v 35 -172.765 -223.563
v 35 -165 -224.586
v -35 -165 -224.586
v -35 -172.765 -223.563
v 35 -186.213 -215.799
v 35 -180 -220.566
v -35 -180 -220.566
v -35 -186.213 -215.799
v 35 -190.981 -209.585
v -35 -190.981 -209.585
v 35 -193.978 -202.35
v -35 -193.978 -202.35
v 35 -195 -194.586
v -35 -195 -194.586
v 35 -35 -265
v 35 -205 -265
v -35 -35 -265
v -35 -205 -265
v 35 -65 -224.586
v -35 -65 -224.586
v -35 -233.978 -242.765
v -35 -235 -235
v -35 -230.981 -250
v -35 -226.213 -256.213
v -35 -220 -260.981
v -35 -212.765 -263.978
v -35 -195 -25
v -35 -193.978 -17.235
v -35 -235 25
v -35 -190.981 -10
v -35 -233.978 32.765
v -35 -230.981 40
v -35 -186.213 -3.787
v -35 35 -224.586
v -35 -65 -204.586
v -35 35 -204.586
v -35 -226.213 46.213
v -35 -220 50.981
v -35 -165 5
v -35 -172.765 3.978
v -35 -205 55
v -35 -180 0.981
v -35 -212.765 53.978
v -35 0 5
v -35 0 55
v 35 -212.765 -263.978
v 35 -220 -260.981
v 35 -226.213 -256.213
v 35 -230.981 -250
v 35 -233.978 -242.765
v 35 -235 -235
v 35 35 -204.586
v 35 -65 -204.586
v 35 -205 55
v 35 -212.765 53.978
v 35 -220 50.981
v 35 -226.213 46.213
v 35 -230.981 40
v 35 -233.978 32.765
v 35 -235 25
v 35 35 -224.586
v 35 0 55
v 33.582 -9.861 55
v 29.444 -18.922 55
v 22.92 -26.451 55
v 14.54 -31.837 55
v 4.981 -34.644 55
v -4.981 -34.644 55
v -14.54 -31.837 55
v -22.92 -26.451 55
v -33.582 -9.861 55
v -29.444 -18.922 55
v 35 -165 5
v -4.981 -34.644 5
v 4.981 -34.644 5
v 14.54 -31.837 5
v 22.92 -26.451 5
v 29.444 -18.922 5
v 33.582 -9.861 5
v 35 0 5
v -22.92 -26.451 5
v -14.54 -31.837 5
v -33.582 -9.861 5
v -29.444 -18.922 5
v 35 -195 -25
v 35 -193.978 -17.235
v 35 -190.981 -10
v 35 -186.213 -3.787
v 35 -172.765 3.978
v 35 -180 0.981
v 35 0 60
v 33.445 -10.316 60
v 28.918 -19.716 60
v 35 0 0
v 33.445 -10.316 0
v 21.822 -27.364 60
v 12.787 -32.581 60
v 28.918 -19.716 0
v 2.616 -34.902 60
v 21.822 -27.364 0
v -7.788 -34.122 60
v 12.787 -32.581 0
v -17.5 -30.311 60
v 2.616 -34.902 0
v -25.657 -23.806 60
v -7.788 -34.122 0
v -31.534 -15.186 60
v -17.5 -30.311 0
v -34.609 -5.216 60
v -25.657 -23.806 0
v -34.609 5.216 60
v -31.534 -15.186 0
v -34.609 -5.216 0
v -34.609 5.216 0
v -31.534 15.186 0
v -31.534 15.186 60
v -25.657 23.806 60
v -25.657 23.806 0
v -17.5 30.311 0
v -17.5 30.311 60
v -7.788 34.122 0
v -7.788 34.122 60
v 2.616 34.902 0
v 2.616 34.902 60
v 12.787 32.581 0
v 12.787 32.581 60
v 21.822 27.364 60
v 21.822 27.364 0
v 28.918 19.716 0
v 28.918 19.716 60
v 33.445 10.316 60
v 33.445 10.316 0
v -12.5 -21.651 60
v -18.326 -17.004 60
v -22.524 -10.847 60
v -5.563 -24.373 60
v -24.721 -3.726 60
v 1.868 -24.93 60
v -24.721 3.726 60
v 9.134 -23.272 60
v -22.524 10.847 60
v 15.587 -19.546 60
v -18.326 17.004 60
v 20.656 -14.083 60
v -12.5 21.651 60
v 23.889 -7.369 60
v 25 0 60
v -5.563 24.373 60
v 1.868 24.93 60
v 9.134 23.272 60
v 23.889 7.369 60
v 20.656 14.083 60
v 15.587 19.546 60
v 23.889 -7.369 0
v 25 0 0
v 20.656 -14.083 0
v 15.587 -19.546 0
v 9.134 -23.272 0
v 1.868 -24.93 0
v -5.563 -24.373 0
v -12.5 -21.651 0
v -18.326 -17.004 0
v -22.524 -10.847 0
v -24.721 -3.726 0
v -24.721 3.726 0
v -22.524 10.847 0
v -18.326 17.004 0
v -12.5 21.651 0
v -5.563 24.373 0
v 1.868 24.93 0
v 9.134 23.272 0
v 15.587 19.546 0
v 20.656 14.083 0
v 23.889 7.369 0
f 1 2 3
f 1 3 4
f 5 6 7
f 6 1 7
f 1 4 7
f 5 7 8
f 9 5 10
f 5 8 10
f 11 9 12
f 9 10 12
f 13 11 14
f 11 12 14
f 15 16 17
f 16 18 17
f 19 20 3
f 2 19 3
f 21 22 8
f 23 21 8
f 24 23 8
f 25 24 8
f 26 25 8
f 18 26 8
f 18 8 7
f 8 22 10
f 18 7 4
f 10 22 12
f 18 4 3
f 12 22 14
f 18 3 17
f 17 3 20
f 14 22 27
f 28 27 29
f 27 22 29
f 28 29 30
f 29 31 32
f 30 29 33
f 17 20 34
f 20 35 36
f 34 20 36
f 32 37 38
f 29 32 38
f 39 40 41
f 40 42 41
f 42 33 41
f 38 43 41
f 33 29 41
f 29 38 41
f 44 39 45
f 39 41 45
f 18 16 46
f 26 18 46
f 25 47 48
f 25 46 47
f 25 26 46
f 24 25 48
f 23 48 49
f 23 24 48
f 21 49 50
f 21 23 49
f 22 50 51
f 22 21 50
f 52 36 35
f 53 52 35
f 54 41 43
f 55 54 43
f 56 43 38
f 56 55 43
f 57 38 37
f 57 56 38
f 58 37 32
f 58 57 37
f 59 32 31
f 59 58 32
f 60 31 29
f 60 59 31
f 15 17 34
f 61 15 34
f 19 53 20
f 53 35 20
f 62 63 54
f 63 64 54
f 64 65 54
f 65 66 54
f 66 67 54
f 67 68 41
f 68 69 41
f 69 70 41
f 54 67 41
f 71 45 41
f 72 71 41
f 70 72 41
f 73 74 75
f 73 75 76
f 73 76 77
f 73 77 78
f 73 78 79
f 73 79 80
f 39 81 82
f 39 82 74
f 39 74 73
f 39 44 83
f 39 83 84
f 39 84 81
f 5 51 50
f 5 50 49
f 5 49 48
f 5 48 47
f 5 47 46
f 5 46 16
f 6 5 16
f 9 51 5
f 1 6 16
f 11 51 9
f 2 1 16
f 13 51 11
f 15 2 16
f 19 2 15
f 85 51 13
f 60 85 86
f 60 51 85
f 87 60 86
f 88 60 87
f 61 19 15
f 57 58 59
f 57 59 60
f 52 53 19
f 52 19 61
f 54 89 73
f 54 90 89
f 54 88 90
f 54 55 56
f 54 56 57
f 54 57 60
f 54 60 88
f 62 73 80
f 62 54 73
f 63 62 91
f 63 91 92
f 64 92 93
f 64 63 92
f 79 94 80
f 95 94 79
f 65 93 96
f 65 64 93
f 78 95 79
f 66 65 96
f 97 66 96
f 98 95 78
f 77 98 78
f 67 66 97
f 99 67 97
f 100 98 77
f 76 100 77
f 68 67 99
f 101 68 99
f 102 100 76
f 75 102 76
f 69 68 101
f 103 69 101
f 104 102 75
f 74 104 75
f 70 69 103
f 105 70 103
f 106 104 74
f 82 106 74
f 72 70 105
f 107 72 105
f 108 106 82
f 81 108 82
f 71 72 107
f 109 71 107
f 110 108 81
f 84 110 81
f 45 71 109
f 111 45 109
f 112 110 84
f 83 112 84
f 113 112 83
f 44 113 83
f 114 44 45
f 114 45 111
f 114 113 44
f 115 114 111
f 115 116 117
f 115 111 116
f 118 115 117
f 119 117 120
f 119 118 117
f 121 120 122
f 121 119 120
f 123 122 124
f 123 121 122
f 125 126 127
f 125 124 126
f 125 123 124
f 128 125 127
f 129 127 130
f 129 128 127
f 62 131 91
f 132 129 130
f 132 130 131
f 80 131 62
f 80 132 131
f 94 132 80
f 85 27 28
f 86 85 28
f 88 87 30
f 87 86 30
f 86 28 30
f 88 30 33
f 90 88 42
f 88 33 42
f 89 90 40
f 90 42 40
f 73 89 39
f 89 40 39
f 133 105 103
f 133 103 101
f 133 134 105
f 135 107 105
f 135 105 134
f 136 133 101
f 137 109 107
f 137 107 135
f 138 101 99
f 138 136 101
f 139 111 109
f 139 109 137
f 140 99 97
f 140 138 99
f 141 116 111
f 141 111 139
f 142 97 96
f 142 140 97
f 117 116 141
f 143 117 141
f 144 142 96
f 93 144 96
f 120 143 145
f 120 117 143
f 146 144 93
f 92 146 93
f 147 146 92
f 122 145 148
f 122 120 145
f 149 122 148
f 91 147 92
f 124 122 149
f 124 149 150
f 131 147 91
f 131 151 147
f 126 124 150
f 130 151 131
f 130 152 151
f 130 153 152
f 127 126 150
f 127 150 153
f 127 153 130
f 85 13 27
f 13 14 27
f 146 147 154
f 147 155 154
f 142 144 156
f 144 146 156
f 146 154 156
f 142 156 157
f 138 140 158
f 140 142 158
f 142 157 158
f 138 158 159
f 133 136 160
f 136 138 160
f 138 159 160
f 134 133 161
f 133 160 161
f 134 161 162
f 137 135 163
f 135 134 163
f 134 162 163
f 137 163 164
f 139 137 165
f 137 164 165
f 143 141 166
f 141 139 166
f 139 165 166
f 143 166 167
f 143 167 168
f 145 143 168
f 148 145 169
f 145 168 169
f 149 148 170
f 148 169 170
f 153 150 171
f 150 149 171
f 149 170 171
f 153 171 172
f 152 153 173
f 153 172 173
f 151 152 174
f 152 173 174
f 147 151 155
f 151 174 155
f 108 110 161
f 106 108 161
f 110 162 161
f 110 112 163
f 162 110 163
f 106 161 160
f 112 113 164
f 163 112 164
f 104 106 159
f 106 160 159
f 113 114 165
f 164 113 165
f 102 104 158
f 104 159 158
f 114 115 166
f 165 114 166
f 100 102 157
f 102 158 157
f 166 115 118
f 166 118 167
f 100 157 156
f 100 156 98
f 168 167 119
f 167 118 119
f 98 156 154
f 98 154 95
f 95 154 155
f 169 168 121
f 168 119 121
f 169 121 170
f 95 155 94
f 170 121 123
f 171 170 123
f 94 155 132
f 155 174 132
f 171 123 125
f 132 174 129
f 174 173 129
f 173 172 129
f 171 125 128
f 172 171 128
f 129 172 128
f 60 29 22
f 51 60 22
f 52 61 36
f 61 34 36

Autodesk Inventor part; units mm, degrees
ref_plane "YZ Plane" through (0, 0, 0) normal (1, 0, 0) x (0, 1, 0)
ref_plane "XZ Plane" through (0, 0, 0) normal (0, 1, 0) x (-1, 0, 0)
ref_plane "XY Plane" through (0, 0, 0) normal (0, 0, 1) x (1, 0, 0)
sketch "Esboço1" plane through (0, 0, 0) normal (0, 0, 1) x (1, 0, 0)
  circle A0 centre (0, 0) radius 25
  circle A1 centre (0, 0) radius 35
  dimension "d0" = 50
  dimension "d1" = 70
extrude "Extrusão1" add sketch "Esboço1" along normal blind 60
sketch "Esboço2" plane through (0, 0, 0) normal (1, 0, 0) x (0, 1, 0)
  line L0 (35, 0) -> (-35, 0) construction
  line L1 (-35, 0) -> (-35, 5) construction
  line L2 (-35, 0) -> (-35, 60) construction
  line L3 (-35, 5) -> (-195, 5)
  line L4 (-35, 60) -> (-35, 55) construction
  line L5 (-35, 55) -> (-235, 55)
  line L6 (-235, 55) -> (-235, -265)
  line L7 (-235, -265) -> (-35, -265)
  line L8 (-35, -265) -> (35, -224.5855)
  line L9 (35, 0) -> (35, -224.5855) construction
  line L10 (35, -224.5855) -> (35, -204.5855)
  line L11 (35, -204.5855) -> (-65, -204.5855)
  line L12 (-65, -204.5855) -> (-65, -224.5855)
  line L13 (-65, -224.5855) -> (-195, -224.5855)
  line L14 (-195, -224.5855) -> (-195, 5)
  line L15 (-35, 55) -> (-35, 5)
  point P0 (0, 0)
  dimension "d4" = 5
  dimension "d5" = 160
  dimension "d6" = 5
  dimension "d7" = 200
  dimension "d8" = 320
  dimension "d9" = 200
  dimension "d10" = 150
  dimension "d11" = 20
  dimension "d12" = 100
  dimension "d13" = 20
  dimension "d14" = 130
extrude "Extrusão2" add sketch "Esboço2" along normal mid plane 70
fillet "Arredondamento1" radius 30 4 edges at (0, -235, 55) (0, -195, 5) (0, -235, -265) (0, -195, -224.5855)
sketch "Esboço3" plane through (-35, -35, 5) normal (0, 1, 0) x (1, 0, 0)
  line L0 (70, -20) -> (70, -50) projected
  line L1 (0, 0) -> (70, 0) projected
  line L2 (70, -50) -> (0, -50)
  line L3 (0, -50) -> (0, 0)
  line L4 (0, 0) -> (70, 0)
  line L5 (70, 0) -> (70, -50)
  point P0 (35, 5)
extrude "Extrusão3" add sketch "Esboço3" along normal up to next
thread "Rosca1" size "M50x4" class "6H" standard "ANSI Metric M Profile" length 60
properties part number "Corpo da Morsa"
